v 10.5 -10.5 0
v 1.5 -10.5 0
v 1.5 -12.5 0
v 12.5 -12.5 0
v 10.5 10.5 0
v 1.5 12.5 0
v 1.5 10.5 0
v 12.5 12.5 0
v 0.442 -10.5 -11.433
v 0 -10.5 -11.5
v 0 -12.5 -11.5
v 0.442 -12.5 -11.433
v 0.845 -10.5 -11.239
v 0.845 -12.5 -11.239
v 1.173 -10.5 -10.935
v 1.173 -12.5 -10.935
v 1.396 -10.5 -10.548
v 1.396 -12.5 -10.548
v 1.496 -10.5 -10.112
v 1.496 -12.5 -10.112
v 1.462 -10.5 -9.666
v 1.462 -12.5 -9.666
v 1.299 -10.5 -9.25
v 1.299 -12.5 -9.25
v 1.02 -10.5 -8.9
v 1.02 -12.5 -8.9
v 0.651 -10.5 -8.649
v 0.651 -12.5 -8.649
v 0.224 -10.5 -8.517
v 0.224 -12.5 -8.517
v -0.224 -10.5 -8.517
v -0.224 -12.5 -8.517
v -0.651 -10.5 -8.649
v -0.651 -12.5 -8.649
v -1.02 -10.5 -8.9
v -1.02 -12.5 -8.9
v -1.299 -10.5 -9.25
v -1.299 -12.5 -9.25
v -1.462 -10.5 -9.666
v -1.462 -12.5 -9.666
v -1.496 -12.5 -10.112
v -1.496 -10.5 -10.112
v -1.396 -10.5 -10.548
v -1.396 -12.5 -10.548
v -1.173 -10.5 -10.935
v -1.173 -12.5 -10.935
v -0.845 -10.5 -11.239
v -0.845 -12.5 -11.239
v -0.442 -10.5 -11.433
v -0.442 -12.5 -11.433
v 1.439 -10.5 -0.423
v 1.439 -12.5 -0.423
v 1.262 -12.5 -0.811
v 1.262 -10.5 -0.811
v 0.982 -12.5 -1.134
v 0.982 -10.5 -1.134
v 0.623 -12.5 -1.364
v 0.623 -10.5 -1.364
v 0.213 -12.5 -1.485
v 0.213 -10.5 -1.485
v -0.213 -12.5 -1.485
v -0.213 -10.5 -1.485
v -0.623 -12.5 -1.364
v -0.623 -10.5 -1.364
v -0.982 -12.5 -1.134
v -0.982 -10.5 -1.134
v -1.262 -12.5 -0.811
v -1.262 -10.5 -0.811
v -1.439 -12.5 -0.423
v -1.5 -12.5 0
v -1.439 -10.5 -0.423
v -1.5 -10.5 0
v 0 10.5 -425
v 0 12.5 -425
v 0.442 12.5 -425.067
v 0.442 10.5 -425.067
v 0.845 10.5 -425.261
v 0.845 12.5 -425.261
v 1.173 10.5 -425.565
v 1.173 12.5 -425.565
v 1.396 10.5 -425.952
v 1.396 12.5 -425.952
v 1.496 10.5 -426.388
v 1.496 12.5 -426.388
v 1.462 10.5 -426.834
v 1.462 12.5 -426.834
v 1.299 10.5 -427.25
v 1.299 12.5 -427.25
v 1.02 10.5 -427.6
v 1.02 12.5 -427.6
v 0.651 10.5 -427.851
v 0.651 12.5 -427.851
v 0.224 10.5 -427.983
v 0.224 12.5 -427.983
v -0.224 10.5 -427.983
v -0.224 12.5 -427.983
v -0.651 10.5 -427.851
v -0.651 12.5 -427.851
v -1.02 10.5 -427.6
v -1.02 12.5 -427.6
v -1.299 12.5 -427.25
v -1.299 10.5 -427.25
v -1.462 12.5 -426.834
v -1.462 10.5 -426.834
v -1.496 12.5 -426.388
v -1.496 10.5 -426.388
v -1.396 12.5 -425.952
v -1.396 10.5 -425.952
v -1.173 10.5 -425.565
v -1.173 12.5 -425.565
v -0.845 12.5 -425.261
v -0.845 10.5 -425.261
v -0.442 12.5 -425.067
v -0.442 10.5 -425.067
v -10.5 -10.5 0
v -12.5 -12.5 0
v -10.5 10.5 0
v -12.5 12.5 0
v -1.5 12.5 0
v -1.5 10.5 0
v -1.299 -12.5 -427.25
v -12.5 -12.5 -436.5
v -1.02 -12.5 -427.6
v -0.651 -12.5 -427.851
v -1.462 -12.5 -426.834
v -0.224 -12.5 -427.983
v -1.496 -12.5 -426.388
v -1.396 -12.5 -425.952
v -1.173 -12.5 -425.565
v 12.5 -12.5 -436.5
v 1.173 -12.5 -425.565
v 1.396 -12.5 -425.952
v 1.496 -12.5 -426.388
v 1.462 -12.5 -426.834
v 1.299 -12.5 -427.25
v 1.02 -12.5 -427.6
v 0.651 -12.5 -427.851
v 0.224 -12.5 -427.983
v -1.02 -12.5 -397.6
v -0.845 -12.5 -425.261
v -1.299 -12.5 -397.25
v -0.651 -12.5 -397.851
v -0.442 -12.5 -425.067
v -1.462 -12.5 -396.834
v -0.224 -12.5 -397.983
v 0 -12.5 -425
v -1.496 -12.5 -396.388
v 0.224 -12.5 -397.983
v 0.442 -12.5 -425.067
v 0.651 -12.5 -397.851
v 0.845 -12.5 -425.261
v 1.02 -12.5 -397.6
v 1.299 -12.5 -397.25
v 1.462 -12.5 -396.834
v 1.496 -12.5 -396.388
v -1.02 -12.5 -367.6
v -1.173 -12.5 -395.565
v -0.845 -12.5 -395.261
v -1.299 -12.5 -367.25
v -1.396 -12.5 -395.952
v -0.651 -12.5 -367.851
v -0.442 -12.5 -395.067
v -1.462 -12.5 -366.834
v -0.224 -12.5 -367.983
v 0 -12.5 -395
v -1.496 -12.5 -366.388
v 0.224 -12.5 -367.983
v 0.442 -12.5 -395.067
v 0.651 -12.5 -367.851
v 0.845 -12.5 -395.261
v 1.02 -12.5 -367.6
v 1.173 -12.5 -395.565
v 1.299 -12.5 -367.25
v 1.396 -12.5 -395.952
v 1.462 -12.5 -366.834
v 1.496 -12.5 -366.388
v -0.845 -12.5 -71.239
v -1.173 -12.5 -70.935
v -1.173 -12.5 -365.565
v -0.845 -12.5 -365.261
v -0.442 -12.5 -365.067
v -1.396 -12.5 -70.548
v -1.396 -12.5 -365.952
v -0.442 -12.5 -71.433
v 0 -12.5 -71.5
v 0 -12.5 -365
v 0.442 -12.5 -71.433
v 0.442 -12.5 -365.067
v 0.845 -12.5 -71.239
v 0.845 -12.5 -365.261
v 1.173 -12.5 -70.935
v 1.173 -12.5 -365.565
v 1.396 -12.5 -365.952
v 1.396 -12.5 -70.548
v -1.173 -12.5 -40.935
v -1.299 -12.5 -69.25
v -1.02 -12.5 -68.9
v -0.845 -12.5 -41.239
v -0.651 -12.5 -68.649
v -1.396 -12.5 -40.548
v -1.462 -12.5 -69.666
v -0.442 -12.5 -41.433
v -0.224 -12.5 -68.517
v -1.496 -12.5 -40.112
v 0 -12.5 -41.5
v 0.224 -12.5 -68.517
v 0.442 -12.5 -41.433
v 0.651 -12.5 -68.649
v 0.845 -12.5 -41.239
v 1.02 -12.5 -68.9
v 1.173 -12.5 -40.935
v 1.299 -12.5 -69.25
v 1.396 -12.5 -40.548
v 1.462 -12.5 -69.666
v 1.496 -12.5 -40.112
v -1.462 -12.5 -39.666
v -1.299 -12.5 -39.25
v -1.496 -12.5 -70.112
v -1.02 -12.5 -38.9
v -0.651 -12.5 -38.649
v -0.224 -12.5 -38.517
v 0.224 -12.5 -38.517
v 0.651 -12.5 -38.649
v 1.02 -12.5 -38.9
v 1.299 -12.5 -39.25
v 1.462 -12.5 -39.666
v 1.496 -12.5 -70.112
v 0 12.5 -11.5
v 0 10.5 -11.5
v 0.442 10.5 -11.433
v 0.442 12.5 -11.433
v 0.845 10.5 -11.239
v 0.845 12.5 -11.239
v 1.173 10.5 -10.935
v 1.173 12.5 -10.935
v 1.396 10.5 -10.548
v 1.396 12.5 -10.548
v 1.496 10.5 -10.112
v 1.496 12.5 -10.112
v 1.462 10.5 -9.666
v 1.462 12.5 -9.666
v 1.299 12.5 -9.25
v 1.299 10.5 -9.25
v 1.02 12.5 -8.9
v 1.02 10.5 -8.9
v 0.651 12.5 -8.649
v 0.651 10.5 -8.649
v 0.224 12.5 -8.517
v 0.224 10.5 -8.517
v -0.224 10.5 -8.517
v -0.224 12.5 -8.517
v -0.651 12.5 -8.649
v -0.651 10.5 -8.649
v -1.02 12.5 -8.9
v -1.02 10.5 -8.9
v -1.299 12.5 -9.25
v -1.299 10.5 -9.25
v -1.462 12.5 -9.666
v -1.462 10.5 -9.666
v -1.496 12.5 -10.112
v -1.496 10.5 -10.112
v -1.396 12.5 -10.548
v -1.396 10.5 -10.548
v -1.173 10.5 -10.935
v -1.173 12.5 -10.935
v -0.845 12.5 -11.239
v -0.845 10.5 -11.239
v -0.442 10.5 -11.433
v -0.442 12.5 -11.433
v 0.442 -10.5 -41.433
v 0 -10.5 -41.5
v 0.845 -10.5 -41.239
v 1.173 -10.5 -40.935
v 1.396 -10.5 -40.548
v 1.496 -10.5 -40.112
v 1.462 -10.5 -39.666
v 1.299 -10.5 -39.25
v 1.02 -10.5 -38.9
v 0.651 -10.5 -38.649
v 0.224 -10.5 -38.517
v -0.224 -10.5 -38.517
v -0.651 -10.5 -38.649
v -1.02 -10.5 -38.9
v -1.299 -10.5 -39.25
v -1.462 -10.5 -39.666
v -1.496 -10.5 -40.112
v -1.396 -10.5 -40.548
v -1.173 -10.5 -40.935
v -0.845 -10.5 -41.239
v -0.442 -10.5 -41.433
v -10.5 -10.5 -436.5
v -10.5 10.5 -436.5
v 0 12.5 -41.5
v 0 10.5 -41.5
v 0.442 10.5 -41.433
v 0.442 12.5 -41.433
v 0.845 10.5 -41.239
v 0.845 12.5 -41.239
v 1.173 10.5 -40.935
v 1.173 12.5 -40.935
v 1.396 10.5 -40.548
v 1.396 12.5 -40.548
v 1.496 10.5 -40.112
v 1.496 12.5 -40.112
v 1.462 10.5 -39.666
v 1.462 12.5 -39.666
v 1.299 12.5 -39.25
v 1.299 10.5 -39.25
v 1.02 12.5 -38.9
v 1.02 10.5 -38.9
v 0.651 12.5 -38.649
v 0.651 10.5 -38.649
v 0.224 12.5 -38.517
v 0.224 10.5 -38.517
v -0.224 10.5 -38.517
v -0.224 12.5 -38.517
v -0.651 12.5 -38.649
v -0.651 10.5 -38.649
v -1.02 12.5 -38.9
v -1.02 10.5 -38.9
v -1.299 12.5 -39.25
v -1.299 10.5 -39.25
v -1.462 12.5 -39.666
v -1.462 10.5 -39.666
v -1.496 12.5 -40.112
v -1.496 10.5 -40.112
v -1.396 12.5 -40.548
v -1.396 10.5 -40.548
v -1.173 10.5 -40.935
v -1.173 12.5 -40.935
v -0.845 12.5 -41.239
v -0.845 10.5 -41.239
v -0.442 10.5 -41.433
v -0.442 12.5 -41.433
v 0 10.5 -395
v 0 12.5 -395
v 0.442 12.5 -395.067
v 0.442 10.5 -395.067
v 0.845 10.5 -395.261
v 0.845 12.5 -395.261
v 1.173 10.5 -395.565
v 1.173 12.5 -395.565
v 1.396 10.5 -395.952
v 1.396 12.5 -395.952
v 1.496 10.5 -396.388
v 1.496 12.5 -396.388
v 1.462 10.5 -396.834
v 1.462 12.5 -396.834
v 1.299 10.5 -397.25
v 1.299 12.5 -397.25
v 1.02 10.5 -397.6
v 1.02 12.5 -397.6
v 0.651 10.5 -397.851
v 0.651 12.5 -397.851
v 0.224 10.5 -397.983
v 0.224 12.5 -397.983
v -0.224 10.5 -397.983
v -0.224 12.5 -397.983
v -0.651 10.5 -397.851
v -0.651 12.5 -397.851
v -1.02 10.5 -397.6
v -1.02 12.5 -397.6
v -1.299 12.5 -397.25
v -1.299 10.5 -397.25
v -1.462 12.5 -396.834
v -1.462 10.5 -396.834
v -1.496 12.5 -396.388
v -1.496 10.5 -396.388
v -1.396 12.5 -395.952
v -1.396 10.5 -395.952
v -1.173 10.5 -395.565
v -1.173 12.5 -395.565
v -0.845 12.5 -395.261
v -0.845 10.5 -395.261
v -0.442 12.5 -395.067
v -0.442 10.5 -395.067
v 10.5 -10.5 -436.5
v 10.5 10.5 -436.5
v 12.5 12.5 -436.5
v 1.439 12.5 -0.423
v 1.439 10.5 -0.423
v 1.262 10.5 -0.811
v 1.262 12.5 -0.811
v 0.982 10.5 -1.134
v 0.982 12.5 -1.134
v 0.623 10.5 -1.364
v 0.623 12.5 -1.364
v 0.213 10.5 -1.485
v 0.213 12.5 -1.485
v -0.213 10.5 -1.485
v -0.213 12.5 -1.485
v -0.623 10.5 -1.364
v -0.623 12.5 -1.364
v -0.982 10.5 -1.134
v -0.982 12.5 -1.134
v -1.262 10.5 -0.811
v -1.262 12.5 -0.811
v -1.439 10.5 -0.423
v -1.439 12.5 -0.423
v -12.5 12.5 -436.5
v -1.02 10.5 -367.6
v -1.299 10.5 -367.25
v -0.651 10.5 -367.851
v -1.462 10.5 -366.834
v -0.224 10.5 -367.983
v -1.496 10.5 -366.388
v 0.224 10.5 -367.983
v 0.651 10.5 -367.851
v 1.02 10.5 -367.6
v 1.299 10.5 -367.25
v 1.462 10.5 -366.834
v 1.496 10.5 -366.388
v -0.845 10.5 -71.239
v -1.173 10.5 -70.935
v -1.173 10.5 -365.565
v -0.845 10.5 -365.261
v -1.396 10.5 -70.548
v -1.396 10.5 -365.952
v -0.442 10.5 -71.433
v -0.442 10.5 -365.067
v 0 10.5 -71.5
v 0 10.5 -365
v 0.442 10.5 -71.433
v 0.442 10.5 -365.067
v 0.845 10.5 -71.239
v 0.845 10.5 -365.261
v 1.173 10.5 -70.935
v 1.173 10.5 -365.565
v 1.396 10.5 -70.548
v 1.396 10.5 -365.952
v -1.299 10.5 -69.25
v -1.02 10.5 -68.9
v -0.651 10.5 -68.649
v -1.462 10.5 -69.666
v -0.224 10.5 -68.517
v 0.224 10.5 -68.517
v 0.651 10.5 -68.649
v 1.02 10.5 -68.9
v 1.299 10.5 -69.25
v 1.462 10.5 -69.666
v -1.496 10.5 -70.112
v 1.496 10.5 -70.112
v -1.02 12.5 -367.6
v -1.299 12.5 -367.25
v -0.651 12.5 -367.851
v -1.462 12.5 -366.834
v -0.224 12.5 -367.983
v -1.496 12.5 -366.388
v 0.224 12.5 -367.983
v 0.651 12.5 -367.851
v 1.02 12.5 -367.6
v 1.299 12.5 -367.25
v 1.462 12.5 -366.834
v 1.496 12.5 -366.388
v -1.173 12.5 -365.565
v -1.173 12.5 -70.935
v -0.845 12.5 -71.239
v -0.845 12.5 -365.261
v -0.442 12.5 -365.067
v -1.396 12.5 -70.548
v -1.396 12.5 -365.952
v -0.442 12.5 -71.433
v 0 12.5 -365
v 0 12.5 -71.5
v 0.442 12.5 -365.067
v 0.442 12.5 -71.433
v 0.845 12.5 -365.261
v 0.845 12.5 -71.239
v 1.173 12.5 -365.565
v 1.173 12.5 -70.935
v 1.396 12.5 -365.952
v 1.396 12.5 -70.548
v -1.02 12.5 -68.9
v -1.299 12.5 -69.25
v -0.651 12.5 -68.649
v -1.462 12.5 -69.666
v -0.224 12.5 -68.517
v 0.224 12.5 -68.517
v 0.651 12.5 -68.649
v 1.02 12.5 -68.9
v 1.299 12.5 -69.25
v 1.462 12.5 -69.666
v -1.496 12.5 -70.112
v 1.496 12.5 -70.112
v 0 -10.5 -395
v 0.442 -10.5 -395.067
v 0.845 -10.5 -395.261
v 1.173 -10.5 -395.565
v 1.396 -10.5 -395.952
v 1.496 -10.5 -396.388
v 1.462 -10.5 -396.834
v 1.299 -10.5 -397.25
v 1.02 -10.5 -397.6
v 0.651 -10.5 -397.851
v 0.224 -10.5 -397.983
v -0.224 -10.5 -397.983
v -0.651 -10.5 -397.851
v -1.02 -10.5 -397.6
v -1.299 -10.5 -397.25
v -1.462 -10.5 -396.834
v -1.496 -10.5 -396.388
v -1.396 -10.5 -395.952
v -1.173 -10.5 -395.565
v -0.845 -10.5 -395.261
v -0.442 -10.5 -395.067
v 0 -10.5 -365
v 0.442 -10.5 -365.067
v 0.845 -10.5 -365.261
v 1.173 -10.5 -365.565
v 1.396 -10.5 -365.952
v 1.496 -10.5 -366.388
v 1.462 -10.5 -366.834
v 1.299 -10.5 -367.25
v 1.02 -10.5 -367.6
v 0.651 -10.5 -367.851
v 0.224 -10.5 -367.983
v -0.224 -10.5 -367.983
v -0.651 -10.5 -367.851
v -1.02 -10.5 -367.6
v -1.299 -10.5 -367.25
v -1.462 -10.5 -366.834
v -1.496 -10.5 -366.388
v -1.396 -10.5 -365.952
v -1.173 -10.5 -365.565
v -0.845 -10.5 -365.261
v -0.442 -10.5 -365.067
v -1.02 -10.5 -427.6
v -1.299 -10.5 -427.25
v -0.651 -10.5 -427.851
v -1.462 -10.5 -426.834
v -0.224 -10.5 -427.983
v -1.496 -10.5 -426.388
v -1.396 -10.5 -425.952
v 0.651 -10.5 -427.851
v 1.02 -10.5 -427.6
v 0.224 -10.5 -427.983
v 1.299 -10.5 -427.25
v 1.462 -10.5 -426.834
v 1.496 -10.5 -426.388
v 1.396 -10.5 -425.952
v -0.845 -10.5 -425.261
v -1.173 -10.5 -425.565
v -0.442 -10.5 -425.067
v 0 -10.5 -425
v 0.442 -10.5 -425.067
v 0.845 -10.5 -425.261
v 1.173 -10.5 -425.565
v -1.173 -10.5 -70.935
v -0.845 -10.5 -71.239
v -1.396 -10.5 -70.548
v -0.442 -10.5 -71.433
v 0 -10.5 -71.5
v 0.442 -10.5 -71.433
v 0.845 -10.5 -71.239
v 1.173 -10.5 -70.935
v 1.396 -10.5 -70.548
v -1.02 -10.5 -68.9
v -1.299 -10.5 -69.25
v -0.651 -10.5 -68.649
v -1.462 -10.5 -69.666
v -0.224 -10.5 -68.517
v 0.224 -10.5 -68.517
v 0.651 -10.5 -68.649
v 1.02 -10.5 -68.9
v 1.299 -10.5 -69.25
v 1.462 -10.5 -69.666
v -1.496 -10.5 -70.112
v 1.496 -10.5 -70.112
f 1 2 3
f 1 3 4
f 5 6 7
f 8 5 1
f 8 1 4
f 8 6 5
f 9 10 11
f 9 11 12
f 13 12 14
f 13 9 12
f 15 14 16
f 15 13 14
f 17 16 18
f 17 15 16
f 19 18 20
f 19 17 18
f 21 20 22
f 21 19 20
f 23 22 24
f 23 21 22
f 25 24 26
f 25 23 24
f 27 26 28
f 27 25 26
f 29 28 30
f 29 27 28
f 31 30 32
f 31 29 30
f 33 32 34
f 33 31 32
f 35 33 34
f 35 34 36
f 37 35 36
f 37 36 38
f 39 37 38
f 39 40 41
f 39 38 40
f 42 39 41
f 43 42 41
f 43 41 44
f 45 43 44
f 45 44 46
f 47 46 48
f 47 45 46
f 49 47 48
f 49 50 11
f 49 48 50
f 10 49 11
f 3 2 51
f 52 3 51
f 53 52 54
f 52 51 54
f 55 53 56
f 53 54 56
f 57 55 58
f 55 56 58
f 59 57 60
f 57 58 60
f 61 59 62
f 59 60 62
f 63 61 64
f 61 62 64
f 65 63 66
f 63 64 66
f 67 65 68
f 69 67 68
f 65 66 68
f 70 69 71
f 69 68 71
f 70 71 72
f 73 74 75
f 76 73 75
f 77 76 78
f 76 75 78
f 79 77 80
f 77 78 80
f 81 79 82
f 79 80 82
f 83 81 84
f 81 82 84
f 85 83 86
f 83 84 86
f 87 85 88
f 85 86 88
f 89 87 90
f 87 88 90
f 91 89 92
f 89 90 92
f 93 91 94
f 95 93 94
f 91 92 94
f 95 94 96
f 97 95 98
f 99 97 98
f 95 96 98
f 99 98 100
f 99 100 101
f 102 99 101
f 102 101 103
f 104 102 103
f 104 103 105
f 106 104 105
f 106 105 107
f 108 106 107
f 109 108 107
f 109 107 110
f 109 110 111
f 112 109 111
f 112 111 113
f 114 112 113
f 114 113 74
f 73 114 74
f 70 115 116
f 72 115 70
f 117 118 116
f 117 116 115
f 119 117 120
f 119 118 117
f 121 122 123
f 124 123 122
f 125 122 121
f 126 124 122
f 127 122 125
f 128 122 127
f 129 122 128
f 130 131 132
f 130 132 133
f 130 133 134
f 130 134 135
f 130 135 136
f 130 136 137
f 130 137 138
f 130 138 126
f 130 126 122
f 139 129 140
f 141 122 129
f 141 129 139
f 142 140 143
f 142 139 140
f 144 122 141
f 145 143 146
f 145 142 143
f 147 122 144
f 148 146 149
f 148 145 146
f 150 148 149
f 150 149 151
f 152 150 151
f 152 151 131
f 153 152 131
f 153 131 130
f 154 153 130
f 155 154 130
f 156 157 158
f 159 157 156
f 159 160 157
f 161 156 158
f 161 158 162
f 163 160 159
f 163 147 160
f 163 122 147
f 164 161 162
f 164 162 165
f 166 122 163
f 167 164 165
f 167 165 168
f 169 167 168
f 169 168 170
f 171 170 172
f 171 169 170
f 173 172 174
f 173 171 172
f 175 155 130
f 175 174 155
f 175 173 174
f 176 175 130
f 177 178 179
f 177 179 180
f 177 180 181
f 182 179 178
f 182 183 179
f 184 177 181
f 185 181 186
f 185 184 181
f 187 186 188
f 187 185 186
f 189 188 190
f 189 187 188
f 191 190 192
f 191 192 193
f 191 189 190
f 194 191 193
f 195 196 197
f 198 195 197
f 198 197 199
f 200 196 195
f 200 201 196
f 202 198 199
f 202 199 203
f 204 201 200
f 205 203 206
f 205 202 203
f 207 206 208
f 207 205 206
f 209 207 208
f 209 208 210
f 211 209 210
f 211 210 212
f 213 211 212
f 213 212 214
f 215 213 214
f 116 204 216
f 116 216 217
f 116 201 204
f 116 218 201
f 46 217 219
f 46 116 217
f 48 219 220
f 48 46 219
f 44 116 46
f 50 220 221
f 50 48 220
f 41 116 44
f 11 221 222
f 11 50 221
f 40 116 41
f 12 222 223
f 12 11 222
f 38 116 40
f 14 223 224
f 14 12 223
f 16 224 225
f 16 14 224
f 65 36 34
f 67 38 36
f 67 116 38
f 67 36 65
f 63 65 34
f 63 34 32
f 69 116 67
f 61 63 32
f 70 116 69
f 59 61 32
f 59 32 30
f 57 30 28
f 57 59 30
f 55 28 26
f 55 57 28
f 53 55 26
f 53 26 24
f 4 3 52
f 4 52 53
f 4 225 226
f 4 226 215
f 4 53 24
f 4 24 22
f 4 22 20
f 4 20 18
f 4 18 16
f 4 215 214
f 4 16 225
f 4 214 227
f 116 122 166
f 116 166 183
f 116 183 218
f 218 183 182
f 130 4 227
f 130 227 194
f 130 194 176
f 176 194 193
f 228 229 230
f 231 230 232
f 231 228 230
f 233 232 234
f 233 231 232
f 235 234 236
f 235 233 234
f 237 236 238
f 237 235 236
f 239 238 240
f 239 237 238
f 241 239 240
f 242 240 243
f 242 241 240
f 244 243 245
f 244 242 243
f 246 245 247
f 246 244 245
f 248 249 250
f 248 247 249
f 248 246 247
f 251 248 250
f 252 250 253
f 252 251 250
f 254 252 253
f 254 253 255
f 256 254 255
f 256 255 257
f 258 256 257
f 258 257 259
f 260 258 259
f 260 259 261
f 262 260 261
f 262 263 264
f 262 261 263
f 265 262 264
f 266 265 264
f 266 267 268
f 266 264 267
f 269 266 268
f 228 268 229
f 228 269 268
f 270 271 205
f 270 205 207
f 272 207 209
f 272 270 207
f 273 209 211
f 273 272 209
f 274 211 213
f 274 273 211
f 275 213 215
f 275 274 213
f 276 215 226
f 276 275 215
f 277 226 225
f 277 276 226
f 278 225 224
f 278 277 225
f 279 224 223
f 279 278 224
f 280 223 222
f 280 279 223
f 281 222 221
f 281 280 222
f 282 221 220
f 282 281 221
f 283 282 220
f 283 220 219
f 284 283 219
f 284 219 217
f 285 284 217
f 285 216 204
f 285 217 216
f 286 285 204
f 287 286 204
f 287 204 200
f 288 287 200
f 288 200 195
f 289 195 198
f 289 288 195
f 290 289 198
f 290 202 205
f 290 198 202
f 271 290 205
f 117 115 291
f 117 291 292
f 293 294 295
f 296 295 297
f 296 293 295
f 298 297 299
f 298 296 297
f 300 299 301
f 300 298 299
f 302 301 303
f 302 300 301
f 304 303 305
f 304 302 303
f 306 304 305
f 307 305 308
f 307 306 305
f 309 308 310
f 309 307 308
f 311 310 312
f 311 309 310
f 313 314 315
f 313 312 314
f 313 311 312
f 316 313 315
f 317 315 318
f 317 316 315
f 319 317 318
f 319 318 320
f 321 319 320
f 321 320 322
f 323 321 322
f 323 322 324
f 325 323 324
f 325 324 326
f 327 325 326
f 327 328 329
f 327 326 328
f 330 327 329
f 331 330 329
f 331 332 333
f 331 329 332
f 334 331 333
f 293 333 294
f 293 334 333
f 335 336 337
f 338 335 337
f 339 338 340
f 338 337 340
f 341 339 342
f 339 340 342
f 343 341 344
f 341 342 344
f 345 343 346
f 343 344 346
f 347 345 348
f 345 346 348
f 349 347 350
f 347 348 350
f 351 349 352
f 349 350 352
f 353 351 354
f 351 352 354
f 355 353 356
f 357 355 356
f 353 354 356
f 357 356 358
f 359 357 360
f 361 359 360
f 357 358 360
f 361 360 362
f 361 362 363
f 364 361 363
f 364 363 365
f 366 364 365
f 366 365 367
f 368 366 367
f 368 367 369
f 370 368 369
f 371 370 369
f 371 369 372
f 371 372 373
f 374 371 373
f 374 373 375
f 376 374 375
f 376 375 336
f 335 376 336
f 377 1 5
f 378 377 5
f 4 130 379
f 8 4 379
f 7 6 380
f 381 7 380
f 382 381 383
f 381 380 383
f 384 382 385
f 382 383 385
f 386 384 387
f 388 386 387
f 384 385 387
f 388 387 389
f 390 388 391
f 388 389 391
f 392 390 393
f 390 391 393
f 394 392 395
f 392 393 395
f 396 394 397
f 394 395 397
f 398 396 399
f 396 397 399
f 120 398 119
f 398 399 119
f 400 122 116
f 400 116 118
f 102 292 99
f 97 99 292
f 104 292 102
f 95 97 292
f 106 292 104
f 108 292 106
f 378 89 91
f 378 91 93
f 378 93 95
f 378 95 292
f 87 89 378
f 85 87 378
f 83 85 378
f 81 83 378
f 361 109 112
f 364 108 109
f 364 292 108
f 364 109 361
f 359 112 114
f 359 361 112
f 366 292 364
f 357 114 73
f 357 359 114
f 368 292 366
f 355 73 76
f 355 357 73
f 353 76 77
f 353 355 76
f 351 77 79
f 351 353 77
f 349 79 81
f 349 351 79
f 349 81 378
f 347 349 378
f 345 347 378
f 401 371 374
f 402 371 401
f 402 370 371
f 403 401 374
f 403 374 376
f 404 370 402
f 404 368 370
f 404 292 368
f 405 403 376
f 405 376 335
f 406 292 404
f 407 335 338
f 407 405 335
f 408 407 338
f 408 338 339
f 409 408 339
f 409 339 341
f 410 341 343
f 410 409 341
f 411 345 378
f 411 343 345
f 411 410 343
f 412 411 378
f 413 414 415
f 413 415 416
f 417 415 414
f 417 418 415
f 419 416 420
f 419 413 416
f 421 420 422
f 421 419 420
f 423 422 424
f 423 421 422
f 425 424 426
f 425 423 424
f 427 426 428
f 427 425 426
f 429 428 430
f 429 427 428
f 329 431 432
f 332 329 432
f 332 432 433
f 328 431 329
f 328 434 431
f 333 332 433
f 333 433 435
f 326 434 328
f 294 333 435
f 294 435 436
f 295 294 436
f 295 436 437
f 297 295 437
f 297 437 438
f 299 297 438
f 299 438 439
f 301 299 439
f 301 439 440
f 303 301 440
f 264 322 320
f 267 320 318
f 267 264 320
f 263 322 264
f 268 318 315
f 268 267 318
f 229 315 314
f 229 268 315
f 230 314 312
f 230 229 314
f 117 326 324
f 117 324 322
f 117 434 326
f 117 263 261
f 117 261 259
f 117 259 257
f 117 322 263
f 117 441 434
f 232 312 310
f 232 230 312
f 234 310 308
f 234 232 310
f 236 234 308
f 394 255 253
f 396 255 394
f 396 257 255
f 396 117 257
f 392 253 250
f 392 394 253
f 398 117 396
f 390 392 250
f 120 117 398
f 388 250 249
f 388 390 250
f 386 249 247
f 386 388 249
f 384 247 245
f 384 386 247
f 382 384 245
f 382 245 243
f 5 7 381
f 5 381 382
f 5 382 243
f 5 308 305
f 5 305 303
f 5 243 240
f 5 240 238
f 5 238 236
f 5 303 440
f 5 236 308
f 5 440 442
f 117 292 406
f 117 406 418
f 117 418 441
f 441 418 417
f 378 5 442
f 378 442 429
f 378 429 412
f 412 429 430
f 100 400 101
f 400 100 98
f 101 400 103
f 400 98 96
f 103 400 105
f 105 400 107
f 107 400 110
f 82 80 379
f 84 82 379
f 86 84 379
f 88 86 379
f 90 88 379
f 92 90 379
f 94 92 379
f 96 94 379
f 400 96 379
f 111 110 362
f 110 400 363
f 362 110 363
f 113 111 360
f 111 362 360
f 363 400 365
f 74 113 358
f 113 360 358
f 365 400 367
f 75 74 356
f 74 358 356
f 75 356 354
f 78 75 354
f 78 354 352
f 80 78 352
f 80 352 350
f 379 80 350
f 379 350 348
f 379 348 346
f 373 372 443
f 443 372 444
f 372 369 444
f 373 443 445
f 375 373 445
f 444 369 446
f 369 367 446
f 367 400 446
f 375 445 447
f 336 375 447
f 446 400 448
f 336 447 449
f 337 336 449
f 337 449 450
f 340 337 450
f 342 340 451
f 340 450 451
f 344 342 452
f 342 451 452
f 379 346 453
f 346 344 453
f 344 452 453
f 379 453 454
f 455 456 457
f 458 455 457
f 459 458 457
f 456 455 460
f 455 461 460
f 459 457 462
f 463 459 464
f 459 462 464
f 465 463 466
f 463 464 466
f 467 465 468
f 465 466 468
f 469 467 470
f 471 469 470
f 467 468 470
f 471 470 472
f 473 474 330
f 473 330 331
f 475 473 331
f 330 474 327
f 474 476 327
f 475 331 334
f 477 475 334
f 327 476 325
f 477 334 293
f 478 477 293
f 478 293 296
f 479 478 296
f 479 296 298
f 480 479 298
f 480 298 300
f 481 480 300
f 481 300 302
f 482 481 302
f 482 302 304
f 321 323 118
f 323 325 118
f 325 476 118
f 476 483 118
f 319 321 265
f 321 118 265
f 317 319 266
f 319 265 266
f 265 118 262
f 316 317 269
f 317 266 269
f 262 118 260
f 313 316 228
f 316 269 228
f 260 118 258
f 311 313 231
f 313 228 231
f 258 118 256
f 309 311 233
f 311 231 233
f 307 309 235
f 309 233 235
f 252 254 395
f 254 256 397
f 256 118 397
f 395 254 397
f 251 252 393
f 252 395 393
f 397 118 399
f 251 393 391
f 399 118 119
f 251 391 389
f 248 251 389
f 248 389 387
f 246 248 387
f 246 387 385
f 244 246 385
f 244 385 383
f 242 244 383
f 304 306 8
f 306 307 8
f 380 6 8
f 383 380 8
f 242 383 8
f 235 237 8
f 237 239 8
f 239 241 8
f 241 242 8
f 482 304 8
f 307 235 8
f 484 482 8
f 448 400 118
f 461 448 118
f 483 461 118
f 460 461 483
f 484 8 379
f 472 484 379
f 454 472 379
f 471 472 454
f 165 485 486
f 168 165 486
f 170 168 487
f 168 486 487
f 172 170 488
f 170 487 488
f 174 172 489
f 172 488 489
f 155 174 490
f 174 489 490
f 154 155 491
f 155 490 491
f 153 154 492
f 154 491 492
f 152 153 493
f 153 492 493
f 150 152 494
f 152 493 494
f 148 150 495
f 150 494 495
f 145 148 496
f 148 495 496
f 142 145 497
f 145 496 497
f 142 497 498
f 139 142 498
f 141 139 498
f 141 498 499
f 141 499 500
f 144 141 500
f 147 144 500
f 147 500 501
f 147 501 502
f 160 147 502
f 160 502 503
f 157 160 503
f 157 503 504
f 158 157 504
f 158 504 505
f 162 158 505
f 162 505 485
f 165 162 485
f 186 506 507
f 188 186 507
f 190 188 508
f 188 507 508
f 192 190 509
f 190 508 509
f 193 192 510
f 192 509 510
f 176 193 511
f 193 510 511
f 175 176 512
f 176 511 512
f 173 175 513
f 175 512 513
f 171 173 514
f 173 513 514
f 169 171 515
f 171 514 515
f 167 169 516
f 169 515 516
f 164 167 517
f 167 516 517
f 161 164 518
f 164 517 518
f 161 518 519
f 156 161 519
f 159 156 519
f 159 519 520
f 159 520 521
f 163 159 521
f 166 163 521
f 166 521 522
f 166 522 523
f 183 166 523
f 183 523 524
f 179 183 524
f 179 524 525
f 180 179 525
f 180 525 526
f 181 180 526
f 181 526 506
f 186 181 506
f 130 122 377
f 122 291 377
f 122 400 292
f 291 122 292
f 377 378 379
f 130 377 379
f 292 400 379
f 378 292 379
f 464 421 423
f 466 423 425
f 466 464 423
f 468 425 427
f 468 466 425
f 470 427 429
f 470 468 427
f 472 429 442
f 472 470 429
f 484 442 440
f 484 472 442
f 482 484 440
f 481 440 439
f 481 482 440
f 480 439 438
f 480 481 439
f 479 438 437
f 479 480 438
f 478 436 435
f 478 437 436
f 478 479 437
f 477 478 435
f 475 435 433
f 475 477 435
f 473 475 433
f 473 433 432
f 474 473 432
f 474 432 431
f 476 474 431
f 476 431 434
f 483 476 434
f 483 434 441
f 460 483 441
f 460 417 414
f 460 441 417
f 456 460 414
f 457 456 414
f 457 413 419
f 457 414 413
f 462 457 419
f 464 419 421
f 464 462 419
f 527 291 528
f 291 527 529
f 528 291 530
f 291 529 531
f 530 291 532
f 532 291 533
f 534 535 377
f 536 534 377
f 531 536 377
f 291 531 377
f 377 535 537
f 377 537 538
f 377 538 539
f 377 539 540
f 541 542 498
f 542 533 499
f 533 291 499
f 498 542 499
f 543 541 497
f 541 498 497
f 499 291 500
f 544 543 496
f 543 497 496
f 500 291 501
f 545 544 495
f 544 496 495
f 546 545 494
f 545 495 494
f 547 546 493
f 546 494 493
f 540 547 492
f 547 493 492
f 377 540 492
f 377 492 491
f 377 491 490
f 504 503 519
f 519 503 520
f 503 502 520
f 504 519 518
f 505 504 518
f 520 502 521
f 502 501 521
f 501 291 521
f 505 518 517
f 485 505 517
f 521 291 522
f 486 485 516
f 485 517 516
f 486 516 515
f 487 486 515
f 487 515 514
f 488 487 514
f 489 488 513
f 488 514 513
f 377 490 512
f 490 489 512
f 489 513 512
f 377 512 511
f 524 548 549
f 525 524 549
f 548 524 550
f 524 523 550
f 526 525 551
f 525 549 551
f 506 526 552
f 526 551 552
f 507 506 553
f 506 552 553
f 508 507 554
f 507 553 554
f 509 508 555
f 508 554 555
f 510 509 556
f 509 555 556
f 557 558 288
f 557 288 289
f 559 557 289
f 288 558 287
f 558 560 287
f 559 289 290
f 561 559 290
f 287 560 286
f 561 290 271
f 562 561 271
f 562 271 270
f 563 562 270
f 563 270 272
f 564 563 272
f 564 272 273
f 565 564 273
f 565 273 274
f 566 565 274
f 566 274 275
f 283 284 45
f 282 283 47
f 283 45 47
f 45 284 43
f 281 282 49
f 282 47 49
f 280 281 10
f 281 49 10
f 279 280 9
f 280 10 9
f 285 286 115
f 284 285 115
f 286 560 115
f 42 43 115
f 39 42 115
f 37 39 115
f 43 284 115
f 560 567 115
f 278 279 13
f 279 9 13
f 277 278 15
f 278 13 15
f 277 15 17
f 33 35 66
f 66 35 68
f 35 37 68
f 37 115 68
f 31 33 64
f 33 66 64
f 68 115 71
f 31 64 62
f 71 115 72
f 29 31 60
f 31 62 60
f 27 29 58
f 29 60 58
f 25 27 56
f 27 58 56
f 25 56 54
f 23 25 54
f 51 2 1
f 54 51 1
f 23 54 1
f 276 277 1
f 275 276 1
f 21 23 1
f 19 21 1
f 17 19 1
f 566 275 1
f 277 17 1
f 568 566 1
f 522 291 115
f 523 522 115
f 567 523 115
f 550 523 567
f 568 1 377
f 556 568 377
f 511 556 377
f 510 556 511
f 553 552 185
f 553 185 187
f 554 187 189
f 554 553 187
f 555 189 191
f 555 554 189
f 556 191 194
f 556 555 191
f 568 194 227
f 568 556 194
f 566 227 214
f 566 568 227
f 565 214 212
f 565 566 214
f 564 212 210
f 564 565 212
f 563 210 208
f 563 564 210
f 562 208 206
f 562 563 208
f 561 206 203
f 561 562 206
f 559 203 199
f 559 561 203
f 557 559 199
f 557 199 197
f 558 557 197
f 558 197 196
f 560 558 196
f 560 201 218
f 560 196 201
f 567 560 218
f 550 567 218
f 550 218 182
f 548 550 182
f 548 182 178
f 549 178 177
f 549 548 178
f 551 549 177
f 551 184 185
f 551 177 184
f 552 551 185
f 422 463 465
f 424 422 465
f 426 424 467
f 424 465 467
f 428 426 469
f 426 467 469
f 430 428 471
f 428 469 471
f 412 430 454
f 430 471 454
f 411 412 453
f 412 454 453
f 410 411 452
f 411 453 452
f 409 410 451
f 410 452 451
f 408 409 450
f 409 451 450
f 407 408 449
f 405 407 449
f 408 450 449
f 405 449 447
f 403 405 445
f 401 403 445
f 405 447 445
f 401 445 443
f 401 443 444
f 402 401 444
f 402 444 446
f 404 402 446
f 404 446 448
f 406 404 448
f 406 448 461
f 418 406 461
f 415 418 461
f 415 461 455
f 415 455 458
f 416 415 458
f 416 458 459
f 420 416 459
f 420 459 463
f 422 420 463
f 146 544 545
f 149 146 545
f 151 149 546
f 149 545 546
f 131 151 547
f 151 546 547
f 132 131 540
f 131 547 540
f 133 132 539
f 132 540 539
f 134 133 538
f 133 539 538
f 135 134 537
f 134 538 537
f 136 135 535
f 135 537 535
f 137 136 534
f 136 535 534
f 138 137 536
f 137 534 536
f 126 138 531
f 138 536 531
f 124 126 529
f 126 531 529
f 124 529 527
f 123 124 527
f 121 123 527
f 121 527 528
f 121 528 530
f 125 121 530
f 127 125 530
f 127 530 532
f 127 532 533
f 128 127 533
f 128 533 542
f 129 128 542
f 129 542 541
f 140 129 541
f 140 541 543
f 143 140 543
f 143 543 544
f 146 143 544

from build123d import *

# Parameters (mm, degrees)
SKETCH1_W           = 25
SKETCH1_H           = 25
SKETCH1_W_2         = 21
SKETCH1_H_2         = 21
BOSS_EXTRUDE1_DEPTH = 436.5
SKETCH2_R           = 1.5
CUT_EXTRUDE1_DEPTH  = 438.393987156
SKETCH3_R           = 1.5
CUT_EXTRUDE2_DEPTH  = 429


with BuildPart() as part:
    # Sketch1 → Boss-Extrude1 (new body)
    with BuildSketch(Plane.XY):
        Rectangle(SKETCH1_W, SKETCH1_H)
        Rectangle(SKETCH1_W_2, SKETCH1_H_2, mode=Mode.SUBTRACT)
    extrude(amount=-BOSS_EXTRUDE1_DEPTH)

    # Sketch2 → Cut-Extrude1 (cut, through all)
    with BuildSketch(Plane(origin=(0, 12.5, 0), x_dir=(1, 0, 0), z_dir=(0, 1, 0))):
        with Locations(Location((0, 366.5, 0), (0, 0, 270))):
            Circle(SKETCH2_R)
        with Locations(Location((0, 396.5, 0), (0, 0, 270))):
            Circle(SKETCH2_R)
        with Locations(Location((0, 426.5, 0), (0, 0, 270))):
            Circle(SKETCH2_R)
    cut_extrude1 = extrude(amount=-CUT_EXTRUDE1_DEPTH, mode=Mode.SUBTRACT)

    # Sketch3 → Cut-Extrude2 (cut)
    with BuildSketch(Plane(origin=(0, 12.5, 0), x_dir=(1, 0, 0), z_dir=(0, 1, 0))):
        Circle(SKETCH3_R)
    extrude(amount=-CUT_EXTRUDE2_DEPTH, mode=Mode.SUBTRACT)

    # Mirror1: Cut-Extrude1 across plane
    add(cut_extrude1.mirror(Plane.XY.offset(-218.25)), mode=Mode.SUBTRACT)


solid = part.part
